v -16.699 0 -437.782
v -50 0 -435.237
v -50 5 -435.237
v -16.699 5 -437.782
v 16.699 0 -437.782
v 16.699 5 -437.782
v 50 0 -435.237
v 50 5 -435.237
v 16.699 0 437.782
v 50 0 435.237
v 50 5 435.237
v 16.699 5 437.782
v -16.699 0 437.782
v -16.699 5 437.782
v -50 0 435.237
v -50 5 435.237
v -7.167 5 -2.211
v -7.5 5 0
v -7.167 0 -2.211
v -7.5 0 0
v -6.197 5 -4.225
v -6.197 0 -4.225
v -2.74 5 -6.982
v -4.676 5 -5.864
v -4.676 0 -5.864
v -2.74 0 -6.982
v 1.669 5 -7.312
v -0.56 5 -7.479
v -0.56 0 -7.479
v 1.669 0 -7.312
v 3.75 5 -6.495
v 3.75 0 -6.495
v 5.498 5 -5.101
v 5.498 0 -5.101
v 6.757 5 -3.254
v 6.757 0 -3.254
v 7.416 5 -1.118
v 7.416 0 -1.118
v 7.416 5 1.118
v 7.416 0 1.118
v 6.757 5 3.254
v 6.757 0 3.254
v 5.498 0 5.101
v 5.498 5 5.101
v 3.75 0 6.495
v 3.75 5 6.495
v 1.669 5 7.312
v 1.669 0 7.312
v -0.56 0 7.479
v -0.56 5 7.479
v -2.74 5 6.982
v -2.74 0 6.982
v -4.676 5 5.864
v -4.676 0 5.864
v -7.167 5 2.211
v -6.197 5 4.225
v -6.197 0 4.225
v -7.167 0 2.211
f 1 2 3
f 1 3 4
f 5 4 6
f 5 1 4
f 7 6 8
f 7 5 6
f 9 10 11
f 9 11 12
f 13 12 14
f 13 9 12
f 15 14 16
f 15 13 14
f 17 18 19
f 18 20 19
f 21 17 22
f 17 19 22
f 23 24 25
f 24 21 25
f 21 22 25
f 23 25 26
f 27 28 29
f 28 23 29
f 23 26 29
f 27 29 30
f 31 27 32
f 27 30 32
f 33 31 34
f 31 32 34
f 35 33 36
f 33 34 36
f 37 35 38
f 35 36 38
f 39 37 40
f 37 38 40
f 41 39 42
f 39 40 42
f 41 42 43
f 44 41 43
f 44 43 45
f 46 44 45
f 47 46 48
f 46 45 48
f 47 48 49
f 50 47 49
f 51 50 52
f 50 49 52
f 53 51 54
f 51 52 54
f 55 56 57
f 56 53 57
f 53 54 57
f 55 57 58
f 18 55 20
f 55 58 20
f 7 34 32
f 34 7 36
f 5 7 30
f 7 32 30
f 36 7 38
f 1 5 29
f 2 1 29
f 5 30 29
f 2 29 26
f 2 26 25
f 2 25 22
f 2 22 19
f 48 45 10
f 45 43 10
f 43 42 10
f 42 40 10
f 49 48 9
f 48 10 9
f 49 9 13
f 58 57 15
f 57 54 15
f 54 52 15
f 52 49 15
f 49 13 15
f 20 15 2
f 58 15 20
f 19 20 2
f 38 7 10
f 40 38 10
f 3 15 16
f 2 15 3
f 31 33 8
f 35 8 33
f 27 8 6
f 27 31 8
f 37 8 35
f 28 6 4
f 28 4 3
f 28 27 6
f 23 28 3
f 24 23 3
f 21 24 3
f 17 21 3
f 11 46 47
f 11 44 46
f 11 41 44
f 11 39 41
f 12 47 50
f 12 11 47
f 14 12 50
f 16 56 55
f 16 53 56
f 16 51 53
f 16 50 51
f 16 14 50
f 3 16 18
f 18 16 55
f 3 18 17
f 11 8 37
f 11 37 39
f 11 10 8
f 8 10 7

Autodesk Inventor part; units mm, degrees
ref_plane "YZ Plane" through (0, 0, 0) normal (1, 0, 0) x (0, 1, 0)
ref_plane "XZ Plane" through (0, 0, 0) normal (0, 1, 0) x (-1, 0, 0)
ref_plane "XY Plane" through (0, 0, 0) normal (0, 0, 1) x (1, 0, 0)
sketch "Sketch1" plane through (0, 0, 0) normal (0, 1, 0) x (-1, 0, 0)
  line L0 (0, 272.2446) -> (0, -272.2446) construction
  line L1 (50, 435.2374) -> (50, -435.2374)
  line L2 (-50, 435.2374) -> (-50, -435.2374)
  arc A0 (50, 435.2374) -> (-50, 435.2374) centre (0, 0) ccw
  arc A1 (-50, -435.2374) -> (50, -435.2374) centre (0, 0) ccw
  circle A2 centre (0, 0) radius 7.5
  dimension "d1" = 438.1
  dimension "d2" = 438.1
  dimension "d3" = 100
  dimension "d6" = 15
extrude "Extrusion1" add sketch "Sketch1" along normal blind 5
properties part number "rotorV1"
